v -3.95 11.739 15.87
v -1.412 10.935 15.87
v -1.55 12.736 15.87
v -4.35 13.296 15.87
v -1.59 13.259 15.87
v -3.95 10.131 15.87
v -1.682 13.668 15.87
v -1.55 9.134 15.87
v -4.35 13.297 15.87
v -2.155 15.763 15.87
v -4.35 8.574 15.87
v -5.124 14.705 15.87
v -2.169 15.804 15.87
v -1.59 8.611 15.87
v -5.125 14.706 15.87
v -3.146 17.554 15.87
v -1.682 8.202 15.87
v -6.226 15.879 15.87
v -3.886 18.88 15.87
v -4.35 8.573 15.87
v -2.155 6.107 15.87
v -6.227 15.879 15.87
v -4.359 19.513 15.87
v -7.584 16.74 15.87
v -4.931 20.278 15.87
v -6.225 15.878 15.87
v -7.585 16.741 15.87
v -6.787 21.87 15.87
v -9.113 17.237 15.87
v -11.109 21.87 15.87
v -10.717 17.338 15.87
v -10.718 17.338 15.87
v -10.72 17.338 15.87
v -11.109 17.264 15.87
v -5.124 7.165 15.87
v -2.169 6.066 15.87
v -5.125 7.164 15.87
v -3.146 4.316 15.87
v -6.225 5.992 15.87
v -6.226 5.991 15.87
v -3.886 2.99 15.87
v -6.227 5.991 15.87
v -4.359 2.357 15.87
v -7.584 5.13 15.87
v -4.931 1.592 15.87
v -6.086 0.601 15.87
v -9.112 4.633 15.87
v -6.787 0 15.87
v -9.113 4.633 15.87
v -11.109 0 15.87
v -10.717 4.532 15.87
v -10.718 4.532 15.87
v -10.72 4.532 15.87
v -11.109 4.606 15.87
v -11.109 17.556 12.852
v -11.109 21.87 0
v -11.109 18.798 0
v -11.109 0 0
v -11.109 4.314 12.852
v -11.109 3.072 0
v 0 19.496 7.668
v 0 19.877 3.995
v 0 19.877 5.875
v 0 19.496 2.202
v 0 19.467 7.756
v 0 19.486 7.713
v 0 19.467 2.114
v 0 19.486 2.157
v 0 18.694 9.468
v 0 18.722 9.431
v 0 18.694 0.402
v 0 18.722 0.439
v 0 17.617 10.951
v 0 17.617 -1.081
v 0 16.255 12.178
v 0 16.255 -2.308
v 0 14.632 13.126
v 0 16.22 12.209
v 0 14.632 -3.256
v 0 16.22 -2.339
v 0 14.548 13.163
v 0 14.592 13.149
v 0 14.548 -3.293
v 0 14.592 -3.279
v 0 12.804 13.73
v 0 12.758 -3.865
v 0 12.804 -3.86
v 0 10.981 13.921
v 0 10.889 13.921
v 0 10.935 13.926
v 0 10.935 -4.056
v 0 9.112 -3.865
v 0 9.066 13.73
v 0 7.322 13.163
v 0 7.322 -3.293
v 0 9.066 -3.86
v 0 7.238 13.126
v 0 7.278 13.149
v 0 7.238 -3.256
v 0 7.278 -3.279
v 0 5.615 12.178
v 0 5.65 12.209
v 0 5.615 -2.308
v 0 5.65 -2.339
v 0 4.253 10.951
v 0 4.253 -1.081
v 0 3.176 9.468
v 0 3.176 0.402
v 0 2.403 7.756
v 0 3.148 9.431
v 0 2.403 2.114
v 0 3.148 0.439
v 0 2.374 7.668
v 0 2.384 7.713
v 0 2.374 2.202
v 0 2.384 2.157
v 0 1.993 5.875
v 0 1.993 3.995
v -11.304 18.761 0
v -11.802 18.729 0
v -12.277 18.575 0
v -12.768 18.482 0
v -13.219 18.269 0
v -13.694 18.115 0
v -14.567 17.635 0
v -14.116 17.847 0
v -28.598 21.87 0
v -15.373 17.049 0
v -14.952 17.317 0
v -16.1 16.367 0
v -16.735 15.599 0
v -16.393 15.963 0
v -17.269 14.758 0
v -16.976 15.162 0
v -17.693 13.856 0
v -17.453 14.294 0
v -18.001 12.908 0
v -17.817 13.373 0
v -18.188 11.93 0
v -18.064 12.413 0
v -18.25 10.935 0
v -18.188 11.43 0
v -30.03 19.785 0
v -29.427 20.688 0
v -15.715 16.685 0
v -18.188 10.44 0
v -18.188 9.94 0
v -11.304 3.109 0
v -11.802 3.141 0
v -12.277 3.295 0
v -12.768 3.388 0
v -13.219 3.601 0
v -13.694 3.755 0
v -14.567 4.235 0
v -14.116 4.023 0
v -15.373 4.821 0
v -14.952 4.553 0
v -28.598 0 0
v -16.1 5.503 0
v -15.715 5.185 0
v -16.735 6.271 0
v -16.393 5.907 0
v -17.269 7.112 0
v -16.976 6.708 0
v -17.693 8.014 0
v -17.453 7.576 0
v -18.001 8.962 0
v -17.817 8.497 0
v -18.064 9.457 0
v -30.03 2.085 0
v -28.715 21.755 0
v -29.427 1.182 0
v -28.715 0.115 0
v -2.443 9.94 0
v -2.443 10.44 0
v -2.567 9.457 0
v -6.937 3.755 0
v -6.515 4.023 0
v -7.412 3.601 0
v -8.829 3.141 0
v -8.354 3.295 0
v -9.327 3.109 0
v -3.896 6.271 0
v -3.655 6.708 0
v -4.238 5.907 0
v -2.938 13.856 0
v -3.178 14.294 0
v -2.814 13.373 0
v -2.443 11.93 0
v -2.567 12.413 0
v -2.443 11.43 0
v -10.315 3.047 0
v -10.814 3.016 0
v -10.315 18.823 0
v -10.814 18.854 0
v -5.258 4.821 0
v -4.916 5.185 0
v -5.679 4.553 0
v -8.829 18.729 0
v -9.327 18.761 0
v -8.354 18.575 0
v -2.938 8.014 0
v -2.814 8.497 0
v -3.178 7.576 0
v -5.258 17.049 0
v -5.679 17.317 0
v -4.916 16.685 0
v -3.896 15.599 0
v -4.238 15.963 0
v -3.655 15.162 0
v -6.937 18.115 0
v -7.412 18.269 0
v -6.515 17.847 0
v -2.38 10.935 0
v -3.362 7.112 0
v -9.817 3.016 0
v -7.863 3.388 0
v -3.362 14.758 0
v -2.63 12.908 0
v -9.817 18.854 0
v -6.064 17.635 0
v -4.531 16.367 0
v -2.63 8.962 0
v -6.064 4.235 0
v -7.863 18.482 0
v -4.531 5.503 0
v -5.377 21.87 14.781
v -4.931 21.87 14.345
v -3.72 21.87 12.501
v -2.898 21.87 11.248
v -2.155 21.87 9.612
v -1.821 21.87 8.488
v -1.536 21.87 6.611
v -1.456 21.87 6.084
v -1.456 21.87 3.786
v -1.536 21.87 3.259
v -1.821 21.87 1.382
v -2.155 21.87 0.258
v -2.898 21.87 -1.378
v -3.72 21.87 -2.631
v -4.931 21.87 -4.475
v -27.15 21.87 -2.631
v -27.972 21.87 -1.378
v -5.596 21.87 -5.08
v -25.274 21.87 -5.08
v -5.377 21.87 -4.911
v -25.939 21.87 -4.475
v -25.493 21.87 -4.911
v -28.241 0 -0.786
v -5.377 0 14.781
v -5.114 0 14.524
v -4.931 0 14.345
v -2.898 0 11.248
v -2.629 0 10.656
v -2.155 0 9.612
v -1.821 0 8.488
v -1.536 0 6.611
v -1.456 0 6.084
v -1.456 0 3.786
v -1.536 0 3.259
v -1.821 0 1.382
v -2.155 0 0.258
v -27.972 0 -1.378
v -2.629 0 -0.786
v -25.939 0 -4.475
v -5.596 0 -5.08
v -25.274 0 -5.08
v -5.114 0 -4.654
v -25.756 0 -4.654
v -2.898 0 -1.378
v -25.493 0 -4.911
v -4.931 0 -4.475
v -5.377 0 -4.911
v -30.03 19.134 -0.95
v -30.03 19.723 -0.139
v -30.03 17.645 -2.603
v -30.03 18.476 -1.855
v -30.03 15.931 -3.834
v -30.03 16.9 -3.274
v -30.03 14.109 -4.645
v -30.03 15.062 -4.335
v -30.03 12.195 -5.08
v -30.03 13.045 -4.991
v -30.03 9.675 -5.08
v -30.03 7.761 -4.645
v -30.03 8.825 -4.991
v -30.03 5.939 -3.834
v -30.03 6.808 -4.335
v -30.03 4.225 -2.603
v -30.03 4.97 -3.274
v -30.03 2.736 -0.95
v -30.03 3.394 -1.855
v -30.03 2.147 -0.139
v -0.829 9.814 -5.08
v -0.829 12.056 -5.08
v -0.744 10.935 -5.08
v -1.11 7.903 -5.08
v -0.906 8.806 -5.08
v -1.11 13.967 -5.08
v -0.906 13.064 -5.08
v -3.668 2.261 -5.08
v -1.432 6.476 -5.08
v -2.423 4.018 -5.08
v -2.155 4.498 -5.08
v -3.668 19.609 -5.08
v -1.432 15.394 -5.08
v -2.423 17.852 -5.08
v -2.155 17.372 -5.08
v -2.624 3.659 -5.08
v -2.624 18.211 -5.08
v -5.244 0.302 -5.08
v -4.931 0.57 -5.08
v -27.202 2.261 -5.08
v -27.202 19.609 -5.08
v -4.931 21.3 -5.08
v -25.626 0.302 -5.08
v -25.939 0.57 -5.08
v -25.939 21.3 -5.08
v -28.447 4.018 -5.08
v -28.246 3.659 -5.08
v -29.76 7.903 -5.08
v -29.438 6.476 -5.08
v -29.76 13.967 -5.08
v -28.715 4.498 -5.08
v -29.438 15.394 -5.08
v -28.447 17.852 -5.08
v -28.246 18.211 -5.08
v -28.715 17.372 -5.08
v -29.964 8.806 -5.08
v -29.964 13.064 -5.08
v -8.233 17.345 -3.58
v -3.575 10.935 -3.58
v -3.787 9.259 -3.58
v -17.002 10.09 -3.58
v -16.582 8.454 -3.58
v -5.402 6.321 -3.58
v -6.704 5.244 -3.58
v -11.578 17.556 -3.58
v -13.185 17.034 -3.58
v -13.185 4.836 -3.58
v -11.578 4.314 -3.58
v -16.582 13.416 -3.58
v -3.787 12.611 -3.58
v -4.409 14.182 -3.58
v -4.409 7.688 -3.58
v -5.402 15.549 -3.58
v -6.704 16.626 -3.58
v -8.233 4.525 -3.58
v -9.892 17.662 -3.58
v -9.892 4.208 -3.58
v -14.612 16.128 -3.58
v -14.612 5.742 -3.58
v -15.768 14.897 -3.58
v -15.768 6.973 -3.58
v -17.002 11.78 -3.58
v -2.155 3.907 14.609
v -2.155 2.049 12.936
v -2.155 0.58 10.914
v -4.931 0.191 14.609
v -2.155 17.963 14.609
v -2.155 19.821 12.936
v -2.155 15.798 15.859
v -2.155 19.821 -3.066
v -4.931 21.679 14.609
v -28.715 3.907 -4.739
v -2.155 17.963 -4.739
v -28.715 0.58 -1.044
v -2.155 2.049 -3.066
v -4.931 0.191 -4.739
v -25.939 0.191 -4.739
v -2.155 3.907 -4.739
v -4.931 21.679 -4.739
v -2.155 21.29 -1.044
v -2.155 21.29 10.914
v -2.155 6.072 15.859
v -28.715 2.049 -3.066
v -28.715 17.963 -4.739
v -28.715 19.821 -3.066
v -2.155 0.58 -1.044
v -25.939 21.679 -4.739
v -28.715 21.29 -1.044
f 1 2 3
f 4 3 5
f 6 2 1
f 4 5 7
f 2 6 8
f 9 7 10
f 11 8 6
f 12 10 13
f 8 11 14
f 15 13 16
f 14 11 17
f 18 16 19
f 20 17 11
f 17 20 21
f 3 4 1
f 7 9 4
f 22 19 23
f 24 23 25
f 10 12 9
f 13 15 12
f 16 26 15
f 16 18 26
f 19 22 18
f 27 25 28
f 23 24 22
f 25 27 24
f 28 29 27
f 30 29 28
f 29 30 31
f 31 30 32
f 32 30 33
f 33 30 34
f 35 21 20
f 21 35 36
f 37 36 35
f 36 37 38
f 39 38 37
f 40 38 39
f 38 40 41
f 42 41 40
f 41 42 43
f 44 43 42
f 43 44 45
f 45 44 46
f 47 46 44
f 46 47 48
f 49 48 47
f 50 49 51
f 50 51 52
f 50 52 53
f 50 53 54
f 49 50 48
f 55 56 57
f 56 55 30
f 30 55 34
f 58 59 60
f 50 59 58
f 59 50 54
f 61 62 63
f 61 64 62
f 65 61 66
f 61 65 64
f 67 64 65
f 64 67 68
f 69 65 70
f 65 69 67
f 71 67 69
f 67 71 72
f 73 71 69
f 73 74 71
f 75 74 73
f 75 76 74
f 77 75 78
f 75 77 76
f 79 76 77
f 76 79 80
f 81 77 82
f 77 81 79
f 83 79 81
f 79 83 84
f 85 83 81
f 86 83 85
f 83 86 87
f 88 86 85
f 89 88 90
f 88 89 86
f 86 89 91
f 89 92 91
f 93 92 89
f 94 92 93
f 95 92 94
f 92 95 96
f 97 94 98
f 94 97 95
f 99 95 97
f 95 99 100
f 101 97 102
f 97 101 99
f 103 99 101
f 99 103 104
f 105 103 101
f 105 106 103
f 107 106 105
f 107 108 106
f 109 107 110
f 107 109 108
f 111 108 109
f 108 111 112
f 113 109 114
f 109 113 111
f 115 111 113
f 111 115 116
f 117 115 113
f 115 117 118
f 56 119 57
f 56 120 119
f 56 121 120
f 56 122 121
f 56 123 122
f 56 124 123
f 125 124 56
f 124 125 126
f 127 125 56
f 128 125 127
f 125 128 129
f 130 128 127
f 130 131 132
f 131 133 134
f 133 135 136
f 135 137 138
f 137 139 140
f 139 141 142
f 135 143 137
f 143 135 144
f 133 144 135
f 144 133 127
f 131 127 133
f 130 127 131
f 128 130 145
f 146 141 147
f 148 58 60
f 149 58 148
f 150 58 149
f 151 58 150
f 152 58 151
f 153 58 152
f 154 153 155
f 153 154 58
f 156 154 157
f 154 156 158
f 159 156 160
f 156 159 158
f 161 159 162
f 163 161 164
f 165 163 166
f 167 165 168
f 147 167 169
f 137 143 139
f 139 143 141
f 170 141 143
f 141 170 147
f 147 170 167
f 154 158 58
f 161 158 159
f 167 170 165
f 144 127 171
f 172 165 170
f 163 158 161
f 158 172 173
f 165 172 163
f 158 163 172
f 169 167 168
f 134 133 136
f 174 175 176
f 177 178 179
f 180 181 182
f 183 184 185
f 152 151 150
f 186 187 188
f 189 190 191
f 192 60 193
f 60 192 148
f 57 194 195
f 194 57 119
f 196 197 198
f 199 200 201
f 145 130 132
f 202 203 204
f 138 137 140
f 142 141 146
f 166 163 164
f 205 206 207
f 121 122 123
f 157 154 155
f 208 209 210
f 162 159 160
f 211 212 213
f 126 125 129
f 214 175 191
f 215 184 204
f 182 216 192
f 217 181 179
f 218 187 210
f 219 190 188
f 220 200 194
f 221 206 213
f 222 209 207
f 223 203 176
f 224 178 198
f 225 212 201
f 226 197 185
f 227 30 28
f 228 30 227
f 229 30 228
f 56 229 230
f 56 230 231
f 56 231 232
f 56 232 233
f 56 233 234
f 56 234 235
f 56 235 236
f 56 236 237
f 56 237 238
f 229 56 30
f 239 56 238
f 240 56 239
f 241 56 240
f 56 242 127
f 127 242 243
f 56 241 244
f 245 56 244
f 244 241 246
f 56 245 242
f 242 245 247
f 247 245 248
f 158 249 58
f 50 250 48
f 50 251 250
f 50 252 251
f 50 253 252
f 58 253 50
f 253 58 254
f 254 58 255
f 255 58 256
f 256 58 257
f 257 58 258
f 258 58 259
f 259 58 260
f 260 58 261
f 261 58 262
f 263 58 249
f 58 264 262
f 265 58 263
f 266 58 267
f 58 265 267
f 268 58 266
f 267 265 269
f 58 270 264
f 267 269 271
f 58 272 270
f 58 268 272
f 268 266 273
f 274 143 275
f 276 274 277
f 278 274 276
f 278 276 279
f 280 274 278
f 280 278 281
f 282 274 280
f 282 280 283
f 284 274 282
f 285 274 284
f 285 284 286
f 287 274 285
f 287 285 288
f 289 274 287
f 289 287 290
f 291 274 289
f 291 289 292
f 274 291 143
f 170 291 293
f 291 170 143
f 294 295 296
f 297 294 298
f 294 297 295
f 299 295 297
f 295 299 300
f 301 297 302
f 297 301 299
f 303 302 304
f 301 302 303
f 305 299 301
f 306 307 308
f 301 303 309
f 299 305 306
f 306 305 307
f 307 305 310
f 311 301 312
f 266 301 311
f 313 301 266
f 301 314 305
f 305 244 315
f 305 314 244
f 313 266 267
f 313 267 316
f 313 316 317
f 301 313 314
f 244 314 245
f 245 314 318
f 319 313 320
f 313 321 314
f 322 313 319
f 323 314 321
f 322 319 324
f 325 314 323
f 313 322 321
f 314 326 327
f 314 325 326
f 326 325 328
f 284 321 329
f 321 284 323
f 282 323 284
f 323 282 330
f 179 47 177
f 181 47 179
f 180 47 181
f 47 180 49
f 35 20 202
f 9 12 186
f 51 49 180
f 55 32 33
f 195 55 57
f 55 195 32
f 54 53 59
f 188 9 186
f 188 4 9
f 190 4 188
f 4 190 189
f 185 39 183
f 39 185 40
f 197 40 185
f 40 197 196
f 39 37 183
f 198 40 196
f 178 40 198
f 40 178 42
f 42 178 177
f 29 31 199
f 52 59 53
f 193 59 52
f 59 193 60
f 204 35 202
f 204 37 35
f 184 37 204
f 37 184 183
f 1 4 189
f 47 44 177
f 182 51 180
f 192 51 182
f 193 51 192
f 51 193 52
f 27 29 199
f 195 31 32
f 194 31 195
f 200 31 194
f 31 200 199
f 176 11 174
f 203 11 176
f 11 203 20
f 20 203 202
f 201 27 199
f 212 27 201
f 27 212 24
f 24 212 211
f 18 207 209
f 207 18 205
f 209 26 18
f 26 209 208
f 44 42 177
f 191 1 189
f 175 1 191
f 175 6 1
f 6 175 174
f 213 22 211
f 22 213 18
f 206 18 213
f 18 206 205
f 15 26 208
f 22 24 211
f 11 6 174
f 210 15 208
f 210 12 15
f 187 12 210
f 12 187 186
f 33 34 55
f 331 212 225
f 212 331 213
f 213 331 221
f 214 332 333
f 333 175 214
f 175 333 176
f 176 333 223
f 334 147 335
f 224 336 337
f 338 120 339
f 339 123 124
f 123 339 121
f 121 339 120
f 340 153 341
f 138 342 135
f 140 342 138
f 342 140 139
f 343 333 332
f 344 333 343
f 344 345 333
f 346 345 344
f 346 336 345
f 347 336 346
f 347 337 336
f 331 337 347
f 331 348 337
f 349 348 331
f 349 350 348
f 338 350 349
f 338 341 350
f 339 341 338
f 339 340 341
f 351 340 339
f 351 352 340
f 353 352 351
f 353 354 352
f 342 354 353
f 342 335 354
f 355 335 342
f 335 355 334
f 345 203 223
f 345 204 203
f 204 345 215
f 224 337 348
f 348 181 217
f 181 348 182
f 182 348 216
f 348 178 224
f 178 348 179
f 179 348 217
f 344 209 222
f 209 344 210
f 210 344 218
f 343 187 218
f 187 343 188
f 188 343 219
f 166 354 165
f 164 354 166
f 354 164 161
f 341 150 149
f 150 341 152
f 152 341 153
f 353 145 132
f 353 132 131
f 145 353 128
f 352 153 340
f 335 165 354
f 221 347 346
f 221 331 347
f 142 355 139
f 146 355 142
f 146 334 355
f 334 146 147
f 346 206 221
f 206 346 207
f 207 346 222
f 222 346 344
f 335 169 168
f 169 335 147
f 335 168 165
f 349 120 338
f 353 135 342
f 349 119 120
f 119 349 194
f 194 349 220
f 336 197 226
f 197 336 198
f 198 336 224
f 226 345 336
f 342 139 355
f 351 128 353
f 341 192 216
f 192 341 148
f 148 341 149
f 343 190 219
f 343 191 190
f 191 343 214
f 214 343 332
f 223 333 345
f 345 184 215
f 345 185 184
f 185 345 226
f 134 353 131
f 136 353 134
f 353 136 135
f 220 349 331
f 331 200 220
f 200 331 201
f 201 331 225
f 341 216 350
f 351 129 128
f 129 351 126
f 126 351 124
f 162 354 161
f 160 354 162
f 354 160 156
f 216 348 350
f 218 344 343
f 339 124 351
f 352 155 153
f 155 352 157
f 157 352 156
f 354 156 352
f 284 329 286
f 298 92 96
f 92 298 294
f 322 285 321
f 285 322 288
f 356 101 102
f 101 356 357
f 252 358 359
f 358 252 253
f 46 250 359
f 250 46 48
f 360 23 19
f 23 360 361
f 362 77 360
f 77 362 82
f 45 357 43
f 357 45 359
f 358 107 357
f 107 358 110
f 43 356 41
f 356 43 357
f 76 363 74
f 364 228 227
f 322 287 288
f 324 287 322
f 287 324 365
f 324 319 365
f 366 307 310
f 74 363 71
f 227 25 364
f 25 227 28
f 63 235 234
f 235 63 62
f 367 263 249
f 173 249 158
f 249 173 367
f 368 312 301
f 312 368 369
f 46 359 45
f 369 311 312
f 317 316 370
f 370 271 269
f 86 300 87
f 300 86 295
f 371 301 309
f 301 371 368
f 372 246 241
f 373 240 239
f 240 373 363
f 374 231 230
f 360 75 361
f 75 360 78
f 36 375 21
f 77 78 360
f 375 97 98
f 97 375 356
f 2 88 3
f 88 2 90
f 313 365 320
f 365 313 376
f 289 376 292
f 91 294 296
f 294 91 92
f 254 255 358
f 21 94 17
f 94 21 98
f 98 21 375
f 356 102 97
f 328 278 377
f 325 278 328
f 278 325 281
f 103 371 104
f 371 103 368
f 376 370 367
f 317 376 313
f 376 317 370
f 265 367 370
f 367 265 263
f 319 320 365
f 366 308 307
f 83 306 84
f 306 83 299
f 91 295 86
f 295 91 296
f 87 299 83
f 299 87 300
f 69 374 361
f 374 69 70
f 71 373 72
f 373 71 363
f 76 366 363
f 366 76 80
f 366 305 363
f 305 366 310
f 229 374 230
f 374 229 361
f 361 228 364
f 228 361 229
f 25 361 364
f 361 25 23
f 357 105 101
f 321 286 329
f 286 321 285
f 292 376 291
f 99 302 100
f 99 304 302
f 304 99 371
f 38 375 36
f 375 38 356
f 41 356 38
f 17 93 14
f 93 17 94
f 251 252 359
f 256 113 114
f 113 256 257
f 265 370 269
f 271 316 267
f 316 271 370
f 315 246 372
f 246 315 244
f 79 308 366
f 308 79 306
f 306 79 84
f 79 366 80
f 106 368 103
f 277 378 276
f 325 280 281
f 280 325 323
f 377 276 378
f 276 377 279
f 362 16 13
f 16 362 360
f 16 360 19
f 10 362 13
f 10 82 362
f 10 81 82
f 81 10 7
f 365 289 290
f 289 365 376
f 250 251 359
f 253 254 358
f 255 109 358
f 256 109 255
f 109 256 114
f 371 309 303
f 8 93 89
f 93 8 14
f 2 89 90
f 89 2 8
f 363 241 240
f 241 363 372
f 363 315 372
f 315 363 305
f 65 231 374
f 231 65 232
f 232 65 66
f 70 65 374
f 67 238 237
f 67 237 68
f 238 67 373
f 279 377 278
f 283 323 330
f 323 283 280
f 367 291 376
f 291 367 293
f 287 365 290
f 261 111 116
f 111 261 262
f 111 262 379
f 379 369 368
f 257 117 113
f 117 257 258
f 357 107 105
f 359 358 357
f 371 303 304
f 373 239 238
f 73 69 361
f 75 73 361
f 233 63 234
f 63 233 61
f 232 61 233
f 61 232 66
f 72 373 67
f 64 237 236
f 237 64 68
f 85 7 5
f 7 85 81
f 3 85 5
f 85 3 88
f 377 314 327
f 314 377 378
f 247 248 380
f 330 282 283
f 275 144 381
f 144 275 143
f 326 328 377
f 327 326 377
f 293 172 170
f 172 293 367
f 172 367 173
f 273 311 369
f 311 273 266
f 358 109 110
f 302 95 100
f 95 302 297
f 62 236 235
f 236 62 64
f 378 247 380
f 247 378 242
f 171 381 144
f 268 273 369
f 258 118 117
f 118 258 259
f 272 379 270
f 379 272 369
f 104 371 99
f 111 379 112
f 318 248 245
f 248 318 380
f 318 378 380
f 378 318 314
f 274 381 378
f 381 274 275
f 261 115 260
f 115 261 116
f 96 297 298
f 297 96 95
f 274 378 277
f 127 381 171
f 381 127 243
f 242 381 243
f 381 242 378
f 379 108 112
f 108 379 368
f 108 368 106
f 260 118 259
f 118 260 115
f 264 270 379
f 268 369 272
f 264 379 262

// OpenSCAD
narrow = 12.83;
wide = 15.87;
depth = 15.88;

butt_dep = 3.58;
butt_narr = 13.48;

wall=3;
height = 30.03;
back = butt_dep + 1.5;

rotate([0,-90,0]) {
    intersection() {
        difference() {
            union() {
                cube([depth-.01, wide+wall*2,wide*.7]);
                translate([-back, 0, 0]) cube([back, wide+wall*2, height]);
            }
            translate([0, wide/2+wall, wide/2*1.3]) rotate([180,-90,0]) cylinder(depth, d1=wide, d2=narrow, 0);
            
                 translate([0, wide/2+wall,wide/2*1.3]) rotate([180, 90, 0]) color([0.3,0.3,0.3]) cylinder(butt_dep, d1=wide,d2=butt_narr, 0);     
    
            }

        translate([wide/2-wall,wide/2+wall,wide/2+wall*2.5]) color([0,1,1,]) sphere(r=wide+wall/1.5);
    }
}
